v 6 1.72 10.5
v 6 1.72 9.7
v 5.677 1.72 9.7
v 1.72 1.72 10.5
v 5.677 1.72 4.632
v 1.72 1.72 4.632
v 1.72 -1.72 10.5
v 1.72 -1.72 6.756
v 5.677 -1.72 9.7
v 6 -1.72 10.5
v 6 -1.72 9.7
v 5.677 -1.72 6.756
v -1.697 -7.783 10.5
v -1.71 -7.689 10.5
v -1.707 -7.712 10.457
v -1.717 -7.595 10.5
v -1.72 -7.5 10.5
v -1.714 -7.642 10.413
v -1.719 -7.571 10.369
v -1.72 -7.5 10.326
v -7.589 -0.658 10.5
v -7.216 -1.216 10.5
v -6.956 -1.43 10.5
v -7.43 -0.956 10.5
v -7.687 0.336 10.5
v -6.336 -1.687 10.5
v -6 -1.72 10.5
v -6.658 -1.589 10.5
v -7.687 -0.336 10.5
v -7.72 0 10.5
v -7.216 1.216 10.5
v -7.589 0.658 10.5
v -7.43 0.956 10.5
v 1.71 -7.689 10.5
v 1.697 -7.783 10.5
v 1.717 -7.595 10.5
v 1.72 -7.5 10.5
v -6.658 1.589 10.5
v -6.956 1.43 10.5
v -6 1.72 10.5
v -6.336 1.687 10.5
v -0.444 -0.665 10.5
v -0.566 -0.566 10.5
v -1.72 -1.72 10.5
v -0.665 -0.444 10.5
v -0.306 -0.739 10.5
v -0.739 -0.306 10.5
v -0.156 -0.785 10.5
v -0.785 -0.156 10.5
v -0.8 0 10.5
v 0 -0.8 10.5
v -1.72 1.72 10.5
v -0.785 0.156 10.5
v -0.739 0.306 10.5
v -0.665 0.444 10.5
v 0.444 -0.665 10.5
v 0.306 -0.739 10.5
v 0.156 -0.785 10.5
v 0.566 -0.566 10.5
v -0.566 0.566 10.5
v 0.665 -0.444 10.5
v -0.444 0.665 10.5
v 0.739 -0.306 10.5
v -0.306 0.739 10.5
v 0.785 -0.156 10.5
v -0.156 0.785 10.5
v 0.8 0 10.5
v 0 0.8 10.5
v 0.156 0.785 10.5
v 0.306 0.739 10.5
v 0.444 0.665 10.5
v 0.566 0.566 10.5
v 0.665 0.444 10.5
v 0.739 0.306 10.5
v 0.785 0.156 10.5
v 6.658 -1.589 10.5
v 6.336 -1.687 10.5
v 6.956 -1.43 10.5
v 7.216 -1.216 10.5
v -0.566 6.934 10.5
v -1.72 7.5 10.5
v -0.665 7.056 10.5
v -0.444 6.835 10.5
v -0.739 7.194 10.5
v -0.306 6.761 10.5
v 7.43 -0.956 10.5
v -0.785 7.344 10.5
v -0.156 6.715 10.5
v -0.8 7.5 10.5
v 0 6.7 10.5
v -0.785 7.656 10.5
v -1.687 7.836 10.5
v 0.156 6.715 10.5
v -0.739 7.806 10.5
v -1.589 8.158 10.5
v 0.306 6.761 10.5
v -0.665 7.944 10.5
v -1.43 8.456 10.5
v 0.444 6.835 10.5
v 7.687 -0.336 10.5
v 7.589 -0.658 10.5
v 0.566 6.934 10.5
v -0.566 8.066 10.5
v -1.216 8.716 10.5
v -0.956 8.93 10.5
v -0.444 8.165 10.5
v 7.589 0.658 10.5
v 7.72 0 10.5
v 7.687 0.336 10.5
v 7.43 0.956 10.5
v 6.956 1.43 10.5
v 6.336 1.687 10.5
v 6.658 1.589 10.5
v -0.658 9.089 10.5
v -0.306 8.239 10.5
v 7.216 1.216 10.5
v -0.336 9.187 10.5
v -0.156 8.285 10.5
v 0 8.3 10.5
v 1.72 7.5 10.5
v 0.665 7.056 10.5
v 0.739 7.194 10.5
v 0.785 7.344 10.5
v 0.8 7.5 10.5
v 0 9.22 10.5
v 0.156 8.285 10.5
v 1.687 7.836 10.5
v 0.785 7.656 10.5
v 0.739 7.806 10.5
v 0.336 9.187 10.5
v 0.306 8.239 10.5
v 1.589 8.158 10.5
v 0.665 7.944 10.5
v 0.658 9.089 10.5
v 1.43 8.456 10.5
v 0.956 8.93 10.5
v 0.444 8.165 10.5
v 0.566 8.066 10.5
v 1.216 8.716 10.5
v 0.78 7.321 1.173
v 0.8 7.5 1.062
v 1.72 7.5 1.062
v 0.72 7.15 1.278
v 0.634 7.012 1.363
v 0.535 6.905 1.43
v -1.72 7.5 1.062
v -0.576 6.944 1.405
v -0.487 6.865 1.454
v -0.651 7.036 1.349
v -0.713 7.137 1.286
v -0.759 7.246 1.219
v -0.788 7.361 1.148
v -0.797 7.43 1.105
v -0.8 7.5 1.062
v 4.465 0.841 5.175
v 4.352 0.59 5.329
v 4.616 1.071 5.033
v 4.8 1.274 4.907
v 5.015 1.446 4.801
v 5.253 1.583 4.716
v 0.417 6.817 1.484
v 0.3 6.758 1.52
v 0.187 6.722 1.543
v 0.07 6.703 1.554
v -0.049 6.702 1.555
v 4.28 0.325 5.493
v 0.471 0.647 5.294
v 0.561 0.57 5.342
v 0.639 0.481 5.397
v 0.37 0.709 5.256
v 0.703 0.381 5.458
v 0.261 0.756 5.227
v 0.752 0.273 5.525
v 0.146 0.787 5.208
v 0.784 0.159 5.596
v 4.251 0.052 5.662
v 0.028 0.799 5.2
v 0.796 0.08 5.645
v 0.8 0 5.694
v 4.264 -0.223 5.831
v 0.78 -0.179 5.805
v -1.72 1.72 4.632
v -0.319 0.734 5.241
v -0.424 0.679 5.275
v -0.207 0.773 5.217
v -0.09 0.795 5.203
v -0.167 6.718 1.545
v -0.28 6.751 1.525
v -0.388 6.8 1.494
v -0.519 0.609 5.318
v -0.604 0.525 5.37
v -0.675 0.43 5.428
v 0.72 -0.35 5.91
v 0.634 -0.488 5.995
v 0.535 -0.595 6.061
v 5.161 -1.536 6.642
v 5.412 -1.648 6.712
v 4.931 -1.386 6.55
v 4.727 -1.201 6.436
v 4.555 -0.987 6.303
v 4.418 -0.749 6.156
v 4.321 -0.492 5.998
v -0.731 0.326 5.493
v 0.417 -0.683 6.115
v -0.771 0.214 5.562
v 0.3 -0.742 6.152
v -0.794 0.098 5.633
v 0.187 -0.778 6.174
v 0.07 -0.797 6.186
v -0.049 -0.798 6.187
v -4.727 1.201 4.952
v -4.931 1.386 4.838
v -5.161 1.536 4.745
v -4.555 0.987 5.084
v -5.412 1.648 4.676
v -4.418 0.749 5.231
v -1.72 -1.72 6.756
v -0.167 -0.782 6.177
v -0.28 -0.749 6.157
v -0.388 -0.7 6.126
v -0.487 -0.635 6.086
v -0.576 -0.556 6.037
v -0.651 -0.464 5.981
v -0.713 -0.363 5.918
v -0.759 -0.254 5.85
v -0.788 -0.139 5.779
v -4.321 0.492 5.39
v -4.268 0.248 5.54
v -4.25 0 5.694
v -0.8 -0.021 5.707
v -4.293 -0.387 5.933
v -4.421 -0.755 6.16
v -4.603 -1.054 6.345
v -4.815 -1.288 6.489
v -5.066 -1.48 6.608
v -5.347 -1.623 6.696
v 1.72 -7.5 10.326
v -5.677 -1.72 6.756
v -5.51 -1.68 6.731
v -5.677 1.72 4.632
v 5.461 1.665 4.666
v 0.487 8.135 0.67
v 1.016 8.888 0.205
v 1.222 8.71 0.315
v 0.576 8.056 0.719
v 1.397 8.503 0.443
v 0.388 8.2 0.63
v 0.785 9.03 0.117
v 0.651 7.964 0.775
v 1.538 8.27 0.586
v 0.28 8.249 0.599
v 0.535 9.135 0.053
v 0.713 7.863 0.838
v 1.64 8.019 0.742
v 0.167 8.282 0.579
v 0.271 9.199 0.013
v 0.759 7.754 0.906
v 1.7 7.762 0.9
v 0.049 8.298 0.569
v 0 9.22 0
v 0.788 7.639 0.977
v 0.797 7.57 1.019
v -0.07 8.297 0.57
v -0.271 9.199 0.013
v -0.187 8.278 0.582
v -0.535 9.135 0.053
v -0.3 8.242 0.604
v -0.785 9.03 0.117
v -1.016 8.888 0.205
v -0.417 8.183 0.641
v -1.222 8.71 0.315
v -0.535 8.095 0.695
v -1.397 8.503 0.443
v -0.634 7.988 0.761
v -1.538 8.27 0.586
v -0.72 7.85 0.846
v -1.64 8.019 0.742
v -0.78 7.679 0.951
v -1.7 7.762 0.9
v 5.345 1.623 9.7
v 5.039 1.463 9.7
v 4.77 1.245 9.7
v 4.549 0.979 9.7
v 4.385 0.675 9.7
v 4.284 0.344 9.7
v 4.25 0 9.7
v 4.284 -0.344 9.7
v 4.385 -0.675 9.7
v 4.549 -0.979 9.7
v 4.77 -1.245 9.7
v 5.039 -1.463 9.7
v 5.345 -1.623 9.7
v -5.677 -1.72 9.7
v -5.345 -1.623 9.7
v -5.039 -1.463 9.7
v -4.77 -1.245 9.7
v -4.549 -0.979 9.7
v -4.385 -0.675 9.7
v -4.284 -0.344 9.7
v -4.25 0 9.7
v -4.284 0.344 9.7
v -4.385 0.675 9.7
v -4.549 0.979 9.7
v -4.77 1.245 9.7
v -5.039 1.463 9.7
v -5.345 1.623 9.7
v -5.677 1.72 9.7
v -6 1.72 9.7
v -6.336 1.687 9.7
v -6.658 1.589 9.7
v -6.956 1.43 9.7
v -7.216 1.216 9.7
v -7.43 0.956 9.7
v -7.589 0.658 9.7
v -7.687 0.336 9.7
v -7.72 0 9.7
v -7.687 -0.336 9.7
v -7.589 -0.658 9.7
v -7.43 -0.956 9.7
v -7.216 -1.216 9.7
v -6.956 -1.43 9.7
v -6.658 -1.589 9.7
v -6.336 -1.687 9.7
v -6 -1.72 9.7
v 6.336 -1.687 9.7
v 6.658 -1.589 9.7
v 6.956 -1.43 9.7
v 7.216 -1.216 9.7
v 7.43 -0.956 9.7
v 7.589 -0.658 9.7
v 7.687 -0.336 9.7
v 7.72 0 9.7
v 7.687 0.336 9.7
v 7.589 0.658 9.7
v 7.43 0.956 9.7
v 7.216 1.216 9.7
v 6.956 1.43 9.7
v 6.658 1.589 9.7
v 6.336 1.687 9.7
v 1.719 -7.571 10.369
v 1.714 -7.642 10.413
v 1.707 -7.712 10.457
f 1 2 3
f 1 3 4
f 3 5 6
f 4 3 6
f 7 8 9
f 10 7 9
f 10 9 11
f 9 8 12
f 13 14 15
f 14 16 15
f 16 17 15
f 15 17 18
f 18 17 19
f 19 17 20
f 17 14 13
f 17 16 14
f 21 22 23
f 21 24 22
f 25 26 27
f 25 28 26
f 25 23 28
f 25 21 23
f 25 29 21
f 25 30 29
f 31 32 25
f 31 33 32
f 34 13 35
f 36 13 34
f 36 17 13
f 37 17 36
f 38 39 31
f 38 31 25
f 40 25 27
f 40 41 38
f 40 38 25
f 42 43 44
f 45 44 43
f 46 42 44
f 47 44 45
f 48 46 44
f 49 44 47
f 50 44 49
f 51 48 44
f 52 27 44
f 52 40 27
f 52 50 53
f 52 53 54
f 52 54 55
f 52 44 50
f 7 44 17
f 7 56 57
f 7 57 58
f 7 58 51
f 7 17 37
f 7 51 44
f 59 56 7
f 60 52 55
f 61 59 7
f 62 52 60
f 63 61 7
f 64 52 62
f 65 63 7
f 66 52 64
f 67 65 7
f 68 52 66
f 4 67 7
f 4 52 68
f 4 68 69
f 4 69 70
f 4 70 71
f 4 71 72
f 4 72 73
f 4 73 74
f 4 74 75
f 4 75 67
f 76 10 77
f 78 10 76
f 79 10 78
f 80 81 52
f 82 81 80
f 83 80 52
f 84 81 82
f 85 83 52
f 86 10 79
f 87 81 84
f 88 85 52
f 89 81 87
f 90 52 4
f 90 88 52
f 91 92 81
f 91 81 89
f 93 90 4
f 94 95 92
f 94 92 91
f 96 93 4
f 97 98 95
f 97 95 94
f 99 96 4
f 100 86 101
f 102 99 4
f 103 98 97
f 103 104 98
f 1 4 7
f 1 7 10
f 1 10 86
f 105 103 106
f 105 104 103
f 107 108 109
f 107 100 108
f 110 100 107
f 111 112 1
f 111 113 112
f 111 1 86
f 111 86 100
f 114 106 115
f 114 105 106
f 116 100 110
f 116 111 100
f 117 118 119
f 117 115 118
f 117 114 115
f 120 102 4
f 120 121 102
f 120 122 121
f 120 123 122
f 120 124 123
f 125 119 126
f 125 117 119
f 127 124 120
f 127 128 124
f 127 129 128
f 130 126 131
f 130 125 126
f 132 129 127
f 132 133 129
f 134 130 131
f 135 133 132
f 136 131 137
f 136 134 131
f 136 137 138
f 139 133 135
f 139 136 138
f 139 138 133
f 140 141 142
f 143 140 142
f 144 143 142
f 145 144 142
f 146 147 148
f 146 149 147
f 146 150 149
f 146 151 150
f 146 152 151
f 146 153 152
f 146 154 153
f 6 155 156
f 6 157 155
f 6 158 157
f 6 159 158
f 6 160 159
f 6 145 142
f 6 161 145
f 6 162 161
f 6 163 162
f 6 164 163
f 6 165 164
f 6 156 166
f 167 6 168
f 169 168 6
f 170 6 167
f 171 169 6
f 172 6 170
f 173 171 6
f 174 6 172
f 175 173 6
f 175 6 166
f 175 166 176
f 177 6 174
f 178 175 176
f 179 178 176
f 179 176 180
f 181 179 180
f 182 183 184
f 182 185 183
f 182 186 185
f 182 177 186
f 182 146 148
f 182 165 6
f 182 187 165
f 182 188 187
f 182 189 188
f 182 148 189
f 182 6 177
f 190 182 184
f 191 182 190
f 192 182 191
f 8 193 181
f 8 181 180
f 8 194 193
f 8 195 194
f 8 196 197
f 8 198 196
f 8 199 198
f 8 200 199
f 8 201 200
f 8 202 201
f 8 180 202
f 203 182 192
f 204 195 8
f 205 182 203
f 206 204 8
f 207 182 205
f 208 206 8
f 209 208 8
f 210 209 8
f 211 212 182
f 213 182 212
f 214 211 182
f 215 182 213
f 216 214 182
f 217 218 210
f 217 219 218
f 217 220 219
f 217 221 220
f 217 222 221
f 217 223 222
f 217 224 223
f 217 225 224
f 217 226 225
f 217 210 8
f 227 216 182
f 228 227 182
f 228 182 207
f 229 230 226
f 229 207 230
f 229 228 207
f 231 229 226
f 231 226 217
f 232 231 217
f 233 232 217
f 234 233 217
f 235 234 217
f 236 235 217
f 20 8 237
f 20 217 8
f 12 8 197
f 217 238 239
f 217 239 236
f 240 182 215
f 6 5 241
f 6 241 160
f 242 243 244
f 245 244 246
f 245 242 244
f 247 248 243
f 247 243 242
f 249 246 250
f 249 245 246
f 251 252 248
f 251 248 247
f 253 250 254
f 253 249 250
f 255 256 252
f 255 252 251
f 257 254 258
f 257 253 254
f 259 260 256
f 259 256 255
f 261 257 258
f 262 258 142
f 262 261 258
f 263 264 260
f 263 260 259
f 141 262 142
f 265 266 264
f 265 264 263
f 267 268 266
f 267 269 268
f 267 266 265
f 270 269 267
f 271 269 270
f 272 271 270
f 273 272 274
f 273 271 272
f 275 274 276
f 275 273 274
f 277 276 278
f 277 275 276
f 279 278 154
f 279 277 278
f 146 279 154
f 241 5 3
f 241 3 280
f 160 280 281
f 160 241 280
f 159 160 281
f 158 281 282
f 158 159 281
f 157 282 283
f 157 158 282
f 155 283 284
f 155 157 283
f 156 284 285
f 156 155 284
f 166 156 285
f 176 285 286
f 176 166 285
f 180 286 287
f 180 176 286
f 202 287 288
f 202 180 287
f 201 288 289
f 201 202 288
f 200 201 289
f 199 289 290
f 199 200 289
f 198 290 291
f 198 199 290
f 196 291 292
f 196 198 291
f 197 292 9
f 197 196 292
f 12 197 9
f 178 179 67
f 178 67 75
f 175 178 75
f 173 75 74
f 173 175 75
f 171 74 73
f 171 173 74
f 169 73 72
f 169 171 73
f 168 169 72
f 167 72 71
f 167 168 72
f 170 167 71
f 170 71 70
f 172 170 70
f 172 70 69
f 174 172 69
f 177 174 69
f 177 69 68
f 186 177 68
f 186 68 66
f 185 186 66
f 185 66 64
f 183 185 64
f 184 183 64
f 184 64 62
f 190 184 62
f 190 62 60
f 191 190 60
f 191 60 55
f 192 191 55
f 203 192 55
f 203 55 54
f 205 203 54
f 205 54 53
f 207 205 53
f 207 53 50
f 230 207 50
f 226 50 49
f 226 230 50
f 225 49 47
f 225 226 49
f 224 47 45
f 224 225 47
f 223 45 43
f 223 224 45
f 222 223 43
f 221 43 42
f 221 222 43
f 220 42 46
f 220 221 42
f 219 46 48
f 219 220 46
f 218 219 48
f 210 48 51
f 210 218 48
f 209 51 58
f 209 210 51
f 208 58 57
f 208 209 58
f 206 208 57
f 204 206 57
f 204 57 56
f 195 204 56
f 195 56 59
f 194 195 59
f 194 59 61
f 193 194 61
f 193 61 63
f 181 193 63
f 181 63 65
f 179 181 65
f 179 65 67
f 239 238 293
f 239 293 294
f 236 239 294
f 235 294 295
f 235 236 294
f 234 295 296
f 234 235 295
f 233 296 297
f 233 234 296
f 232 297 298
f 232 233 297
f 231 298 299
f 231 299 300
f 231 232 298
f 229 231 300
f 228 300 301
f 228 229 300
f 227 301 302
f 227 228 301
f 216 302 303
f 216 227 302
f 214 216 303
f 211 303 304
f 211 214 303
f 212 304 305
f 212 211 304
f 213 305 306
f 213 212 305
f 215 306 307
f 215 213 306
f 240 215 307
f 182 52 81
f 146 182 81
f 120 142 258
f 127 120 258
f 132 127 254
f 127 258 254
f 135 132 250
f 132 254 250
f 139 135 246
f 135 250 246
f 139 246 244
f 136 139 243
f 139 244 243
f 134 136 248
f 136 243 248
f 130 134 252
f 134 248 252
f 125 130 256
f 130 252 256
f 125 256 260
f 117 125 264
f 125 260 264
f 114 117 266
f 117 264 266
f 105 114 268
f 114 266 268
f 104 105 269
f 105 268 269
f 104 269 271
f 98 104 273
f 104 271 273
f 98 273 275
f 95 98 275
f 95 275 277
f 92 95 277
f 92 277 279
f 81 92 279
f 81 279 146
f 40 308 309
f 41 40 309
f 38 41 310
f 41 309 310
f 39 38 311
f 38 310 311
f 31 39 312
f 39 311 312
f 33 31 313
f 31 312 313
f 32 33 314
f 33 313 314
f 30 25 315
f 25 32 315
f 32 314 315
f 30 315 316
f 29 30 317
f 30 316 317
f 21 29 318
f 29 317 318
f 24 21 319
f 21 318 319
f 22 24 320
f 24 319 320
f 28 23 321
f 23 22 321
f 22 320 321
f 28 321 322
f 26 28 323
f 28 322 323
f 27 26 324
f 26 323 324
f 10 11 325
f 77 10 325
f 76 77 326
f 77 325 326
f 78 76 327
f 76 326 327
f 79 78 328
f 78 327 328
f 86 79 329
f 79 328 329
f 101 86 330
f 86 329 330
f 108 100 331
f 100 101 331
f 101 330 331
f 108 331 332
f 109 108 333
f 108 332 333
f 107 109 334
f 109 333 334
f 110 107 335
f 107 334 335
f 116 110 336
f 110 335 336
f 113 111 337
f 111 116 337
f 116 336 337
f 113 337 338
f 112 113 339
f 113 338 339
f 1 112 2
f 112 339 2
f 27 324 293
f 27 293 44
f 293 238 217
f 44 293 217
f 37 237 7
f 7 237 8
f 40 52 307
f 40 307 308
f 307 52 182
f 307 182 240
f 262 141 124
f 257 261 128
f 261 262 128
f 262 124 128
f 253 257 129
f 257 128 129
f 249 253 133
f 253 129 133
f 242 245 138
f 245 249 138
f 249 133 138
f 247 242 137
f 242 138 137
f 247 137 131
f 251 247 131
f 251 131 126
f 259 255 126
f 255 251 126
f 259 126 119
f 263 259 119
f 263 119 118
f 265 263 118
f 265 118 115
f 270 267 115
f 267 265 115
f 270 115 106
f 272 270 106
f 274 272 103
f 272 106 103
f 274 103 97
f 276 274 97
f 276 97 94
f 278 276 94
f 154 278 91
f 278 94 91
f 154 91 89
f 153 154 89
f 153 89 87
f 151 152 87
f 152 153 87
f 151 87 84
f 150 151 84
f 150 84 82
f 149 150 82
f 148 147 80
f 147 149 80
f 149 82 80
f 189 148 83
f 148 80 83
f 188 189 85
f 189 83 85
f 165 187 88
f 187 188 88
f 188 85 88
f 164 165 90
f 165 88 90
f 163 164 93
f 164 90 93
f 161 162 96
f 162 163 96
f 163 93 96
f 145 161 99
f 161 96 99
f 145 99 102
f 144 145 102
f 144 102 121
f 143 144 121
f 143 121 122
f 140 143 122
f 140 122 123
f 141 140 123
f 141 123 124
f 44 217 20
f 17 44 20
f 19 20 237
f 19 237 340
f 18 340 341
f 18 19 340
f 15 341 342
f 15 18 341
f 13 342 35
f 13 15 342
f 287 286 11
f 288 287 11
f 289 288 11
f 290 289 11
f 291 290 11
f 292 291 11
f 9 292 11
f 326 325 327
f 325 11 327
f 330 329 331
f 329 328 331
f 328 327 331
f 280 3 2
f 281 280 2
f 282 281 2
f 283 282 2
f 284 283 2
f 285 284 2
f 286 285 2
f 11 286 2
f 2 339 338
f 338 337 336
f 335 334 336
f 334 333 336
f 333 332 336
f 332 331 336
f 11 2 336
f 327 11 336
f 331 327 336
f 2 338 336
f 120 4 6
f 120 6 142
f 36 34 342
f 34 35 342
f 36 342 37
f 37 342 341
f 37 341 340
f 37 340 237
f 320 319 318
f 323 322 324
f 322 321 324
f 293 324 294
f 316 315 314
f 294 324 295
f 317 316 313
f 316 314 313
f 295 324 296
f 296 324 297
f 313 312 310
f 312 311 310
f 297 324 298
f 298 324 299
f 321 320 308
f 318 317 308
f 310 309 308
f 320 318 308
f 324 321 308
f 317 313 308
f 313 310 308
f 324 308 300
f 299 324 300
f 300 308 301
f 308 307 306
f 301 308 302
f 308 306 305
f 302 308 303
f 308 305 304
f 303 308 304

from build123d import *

# Parameters (mm, degrees)
F0_W          = 4.28
F0_H          = 3.44
F0_W_2        = 3.44
F0_H_2        = 5.78
F1_DEPTH      = 12
F3_DEPTH      = 25
F3_DEPTH_BACK = 25
F5_R          = 0.8
F6_DEPTH      = 55
F7_W          = 30.6417569518
F7_H          = 23.9444840699
F8_DEPTH      = 1.5
F9_R          = 0.8
F10_DEPTH     = 10.501
F4_R          = 1.75
F12_DEPTH     = 9.7


with BuildPart() as f1:
    # F0 (on Top) → F1 (new body)
    with BuildSketch(Plane.XY):
        with Locations((3.86, 0)):
            Rectangle(F0_W, F0_H)
        with BuildLine():
            Line((6, 1.72), (6, -1.72))
            ThreePointArc((6, -1.72), (7.72, 0), (6, 1.72))
        make_face()
        with Locations((0, -4.61)):
            Rectangle(F0_W_2, F0_H_2)
        Rectangle(F0_W_2, F0_H)
        with Locations((-3.86, 0)):
            Rectangle(F0_W, F0_H)
        with BuildLine():
            ThreePointArc((-1.72, -7.5), (0, -9.22), (1.72, -7.5))
            Line((1.72, -7.5), (-1.72, -7.5))
        make_face()
        with Locations((0, 4.61)):
            Rectangle(F0_W_2, F0_H_2)
        with BuildLine():
            ThreePointArc((-6, 1.72), (-7.72, 0), (-6, -1.72))
            Line((-6, -1.72), (-6, 1.72))
        make_face()
        with BuildLine():
            Line((-1.72, 7.5), (1.72, 7.5))
            ThreePointArc((1.72, 7.5), (0, 9.22), (-1.72, 7.5))
        make_face()
    extrude(amount=F1_DEPTH)

    # F2 (on Right) → F3 (cut, two sides)
    with BuildSketch(Plane.YZ) as f3_sk:
        Polygon((-7.5, 0), (7.5, 0), (7.5, 1.0621960754), (-7.5, 10.3255339419), align=None)
        Polygon((7.5, 1.0621960754), (7.5, 0), (9.22, 0), align=None)
        Polygon((-9.22, 0), (-7.5, 0), (-7.5, 10.3255339419), (-9.22, 11.3877300173), align=None)
    extrude(amount=-F3_DEPTH, mode=Mode.SUBTRACT)
    extrude(f3_sk.sketch, amount=F3_DEPTH_BACK, mode=Mode.SUBTRACT)

    # F5 (on Top) → F6 (cut)
    with BuildSketch(Plane.XY):
        Circle(F5_R)
    extrude(amount=F6_DEPTH, mode=Mode.SUBTRACT)

    # F7 (on face) → F8 (cut)
    with BuildSketch(Plane.XY.offset(12)):
        Rectangle(F7_W, F7_H)
    extrude(amount=-F8_DEPTH, mode=Mode.SUBTRACT)

    # F9 (on face) → F10 (cut, through all)
    with BuildSketch(Plane.XY.offset(10.5)):
        with Locations((0, 7.5)):
            Circle(F9_R)
    extrude(amount=-F10_DEPTH, mode=Mode.SUBTRACT)

    # F4 (on Top) → F12 (cut)
    with BuildSketch(Plane.XY):
        with Locations((6, 0)):
            Circle(F4_R)
        with Locations((-6, 0)):
            Circle(F4_R)
    extrude(amount=F12_DEPTH, mode=Mode.SUBTRACT)


solid = f1.part
